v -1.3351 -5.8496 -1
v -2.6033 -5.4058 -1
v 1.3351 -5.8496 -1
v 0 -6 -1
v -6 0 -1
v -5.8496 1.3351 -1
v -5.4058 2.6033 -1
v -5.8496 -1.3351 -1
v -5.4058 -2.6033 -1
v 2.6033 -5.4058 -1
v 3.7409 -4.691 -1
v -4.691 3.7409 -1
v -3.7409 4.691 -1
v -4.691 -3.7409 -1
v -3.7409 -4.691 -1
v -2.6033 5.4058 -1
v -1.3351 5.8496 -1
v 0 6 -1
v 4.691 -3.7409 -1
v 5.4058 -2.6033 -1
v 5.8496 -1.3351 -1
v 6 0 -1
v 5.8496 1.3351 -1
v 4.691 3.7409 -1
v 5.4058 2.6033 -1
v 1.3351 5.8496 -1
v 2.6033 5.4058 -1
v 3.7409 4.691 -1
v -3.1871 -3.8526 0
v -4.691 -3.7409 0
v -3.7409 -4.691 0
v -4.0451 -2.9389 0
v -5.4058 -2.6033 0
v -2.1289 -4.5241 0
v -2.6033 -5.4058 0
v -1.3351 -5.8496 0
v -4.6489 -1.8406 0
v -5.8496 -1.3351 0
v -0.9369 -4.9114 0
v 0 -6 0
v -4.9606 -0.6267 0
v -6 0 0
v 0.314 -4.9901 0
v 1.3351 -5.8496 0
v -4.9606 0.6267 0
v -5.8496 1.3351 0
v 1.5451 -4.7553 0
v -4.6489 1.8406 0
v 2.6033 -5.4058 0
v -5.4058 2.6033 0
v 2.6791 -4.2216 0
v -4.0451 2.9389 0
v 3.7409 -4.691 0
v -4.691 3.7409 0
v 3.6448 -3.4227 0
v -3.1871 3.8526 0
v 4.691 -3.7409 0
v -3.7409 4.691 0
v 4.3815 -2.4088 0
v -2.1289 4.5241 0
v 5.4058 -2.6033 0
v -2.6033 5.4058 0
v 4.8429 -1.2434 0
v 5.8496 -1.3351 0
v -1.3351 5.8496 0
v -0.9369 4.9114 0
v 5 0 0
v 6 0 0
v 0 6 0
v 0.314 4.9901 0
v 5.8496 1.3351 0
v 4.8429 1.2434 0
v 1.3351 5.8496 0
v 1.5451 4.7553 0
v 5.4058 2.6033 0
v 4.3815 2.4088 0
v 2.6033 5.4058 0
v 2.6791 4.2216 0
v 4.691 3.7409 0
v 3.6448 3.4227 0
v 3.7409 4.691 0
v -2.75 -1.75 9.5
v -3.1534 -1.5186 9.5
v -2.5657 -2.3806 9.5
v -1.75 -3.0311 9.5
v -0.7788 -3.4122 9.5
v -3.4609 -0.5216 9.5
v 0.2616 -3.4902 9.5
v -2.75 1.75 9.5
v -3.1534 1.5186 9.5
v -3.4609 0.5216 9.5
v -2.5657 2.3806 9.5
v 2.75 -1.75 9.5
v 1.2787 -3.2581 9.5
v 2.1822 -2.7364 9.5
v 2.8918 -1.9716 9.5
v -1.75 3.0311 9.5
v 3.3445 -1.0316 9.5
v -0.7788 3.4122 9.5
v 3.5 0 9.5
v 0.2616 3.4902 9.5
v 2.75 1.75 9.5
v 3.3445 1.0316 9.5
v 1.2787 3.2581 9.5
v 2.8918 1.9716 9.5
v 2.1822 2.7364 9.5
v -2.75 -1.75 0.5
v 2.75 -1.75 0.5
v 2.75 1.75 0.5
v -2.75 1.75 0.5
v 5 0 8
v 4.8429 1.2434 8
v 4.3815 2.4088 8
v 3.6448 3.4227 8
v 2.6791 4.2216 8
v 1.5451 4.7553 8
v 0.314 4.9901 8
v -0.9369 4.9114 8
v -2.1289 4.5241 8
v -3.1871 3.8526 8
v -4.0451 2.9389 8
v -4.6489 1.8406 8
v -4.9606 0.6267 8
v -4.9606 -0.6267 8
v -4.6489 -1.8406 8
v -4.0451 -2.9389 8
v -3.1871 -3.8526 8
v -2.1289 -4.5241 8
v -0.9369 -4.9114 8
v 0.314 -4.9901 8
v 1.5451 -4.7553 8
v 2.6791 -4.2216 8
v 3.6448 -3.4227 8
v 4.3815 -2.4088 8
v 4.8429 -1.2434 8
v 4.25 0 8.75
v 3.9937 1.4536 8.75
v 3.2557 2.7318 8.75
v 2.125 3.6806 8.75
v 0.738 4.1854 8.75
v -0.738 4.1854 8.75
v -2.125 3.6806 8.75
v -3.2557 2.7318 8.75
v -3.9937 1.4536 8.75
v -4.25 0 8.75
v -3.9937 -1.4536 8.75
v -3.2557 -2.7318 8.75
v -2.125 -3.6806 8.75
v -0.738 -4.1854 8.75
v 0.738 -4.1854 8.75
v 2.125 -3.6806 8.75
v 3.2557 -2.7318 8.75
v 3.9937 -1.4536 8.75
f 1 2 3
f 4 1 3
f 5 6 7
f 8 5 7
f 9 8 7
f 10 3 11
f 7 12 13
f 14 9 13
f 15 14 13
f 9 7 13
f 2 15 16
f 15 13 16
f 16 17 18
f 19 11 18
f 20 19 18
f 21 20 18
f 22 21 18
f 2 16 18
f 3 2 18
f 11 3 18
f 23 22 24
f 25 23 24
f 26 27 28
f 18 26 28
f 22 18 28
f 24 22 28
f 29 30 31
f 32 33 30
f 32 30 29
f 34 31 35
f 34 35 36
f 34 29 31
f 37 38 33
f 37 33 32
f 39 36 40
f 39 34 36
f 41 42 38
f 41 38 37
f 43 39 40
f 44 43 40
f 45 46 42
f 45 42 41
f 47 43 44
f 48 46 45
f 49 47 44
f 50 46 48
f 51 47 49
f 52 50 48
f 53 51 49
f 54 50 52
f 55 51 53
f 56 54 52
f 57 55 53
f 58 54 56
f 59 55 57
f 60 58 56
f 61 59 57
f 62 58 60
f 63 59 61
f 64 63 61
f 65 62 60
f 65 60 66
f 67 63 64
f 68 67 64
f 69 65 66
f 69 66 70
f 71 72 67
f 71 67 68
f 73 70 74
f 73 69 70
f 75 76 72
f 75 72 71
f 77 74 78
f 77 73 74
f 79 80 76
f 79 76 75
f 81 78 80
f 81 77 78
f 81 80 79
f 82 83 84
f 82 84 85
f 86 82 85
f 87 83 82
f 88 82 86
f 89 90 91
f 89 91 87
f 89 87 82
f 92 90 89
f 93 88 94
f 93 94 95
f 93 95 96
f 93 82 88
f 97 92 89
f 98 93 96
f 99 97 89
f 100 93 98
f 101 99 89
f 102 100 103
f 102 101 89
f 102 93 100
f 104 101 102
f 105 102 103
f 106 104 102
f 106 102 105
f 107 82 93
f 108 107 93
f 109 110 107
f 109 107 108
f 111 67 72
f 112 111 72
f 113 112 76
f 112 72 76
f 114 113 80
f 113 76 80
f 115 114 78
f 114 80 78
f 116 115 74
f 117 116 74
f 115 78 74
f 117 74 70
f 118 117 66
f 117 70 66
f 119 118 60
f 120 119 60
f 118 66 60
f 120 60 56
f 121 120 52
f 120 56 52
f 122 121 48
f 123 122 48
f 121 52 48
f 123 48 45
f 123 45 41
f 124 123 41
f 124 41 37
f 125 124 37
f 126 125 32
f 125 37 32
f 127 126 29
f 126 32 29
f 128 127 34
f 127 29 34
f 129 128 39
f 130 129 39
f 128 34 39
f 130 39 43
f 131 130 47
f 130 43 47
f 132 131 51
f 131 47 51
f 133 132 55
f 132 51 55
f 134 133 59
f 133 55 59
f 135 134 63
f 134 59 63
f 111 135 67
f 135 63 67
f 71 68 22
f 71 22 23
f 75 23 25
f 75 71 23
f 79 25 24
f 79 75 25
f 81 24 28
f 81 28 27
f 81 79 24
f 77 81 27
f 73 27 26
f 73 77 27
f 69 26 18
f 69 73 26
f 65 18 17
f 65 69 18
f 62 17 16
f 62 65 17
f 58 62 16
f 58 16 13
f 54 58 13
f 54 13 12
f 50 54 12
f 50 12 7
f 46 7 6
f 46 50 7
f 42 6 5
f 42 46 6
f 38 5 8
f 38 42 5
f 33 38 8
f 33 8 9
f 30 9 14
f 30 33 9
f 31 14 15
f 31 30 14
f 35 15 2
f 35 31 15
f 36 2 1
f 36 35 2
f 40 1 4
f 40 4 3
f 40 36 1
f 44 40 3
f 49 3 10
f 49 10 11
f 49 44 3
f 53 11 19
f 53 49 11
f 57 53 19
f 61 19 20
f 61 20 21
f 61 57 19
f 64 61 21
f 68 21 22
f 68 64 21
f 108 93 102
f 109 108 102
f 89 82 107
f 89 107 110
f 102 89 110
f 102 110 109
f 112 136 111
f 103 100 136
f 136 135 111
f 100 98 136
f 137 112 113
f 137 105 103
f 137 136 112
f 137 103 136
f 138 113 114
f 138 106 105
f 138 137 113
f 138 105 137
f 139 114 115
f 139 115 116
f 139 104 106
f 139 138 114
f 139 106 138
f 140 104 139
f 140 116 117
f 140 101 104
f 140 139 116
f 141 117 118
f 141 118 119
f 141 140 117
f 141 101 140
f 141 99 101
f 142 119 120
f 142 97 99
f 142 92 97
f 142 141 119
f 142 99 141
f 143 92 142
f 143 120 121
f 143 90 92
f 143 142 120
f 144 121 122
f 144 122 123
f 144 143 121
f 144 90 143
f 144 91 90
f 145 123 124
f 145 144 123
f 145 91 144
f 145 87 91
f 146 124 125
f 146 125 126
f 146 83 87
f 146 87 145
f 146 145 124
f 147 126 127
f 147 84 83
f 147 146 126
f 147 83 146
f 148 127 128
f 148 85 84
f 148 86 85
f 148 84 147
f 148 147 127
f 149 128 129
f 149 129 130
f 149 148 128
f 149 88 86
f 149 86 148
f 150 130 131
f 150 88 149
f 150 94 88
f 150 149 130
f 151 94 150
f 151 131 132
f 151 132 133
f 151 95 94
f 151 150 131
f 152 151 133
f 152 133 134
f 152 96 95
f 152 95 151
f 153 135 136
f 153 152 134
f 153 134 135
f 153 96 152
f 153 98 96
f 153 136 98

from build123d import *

# Parameters (mm, degrees)
F0_R     = 5
F1_DEPTH = 9.5
F2_SIZE  = 1.5
F4_R     = 6
F5_DEPTH = 1
F3_W     = 5.5
F3_H     = 3.5
F6_DEPTH = 9


with BuildPart() as f1:
    # F0 (on Top) → F1 (new body)
    with BuildSketch(Plane.XY):
        Circle(F0_R)
    extrude(amount=F1_DEPTH)

    # F2
    f2_edges = [f1.edges().sort_by_distance(p)[0] for p in [
        (-5, 0, 9.5),
    ]]
    chamfer(f2_edges, length=F2_SIZE)

    # F4 (on face) → F5 (join)
    with BuildSketch(Plane.XY):
        Circle(F4_R)
    extrude(amount=-F5_DEPTH)

    # F3 (on face) → F6 (cut)
    with BuildSketch(Plane.XY.offset(9.5)):
        Rectangle(F3_W, F3_H)
    extrude(amount=-F6_DEPTH, mode=Mode.SUBTRACT)


solid = f1.part
